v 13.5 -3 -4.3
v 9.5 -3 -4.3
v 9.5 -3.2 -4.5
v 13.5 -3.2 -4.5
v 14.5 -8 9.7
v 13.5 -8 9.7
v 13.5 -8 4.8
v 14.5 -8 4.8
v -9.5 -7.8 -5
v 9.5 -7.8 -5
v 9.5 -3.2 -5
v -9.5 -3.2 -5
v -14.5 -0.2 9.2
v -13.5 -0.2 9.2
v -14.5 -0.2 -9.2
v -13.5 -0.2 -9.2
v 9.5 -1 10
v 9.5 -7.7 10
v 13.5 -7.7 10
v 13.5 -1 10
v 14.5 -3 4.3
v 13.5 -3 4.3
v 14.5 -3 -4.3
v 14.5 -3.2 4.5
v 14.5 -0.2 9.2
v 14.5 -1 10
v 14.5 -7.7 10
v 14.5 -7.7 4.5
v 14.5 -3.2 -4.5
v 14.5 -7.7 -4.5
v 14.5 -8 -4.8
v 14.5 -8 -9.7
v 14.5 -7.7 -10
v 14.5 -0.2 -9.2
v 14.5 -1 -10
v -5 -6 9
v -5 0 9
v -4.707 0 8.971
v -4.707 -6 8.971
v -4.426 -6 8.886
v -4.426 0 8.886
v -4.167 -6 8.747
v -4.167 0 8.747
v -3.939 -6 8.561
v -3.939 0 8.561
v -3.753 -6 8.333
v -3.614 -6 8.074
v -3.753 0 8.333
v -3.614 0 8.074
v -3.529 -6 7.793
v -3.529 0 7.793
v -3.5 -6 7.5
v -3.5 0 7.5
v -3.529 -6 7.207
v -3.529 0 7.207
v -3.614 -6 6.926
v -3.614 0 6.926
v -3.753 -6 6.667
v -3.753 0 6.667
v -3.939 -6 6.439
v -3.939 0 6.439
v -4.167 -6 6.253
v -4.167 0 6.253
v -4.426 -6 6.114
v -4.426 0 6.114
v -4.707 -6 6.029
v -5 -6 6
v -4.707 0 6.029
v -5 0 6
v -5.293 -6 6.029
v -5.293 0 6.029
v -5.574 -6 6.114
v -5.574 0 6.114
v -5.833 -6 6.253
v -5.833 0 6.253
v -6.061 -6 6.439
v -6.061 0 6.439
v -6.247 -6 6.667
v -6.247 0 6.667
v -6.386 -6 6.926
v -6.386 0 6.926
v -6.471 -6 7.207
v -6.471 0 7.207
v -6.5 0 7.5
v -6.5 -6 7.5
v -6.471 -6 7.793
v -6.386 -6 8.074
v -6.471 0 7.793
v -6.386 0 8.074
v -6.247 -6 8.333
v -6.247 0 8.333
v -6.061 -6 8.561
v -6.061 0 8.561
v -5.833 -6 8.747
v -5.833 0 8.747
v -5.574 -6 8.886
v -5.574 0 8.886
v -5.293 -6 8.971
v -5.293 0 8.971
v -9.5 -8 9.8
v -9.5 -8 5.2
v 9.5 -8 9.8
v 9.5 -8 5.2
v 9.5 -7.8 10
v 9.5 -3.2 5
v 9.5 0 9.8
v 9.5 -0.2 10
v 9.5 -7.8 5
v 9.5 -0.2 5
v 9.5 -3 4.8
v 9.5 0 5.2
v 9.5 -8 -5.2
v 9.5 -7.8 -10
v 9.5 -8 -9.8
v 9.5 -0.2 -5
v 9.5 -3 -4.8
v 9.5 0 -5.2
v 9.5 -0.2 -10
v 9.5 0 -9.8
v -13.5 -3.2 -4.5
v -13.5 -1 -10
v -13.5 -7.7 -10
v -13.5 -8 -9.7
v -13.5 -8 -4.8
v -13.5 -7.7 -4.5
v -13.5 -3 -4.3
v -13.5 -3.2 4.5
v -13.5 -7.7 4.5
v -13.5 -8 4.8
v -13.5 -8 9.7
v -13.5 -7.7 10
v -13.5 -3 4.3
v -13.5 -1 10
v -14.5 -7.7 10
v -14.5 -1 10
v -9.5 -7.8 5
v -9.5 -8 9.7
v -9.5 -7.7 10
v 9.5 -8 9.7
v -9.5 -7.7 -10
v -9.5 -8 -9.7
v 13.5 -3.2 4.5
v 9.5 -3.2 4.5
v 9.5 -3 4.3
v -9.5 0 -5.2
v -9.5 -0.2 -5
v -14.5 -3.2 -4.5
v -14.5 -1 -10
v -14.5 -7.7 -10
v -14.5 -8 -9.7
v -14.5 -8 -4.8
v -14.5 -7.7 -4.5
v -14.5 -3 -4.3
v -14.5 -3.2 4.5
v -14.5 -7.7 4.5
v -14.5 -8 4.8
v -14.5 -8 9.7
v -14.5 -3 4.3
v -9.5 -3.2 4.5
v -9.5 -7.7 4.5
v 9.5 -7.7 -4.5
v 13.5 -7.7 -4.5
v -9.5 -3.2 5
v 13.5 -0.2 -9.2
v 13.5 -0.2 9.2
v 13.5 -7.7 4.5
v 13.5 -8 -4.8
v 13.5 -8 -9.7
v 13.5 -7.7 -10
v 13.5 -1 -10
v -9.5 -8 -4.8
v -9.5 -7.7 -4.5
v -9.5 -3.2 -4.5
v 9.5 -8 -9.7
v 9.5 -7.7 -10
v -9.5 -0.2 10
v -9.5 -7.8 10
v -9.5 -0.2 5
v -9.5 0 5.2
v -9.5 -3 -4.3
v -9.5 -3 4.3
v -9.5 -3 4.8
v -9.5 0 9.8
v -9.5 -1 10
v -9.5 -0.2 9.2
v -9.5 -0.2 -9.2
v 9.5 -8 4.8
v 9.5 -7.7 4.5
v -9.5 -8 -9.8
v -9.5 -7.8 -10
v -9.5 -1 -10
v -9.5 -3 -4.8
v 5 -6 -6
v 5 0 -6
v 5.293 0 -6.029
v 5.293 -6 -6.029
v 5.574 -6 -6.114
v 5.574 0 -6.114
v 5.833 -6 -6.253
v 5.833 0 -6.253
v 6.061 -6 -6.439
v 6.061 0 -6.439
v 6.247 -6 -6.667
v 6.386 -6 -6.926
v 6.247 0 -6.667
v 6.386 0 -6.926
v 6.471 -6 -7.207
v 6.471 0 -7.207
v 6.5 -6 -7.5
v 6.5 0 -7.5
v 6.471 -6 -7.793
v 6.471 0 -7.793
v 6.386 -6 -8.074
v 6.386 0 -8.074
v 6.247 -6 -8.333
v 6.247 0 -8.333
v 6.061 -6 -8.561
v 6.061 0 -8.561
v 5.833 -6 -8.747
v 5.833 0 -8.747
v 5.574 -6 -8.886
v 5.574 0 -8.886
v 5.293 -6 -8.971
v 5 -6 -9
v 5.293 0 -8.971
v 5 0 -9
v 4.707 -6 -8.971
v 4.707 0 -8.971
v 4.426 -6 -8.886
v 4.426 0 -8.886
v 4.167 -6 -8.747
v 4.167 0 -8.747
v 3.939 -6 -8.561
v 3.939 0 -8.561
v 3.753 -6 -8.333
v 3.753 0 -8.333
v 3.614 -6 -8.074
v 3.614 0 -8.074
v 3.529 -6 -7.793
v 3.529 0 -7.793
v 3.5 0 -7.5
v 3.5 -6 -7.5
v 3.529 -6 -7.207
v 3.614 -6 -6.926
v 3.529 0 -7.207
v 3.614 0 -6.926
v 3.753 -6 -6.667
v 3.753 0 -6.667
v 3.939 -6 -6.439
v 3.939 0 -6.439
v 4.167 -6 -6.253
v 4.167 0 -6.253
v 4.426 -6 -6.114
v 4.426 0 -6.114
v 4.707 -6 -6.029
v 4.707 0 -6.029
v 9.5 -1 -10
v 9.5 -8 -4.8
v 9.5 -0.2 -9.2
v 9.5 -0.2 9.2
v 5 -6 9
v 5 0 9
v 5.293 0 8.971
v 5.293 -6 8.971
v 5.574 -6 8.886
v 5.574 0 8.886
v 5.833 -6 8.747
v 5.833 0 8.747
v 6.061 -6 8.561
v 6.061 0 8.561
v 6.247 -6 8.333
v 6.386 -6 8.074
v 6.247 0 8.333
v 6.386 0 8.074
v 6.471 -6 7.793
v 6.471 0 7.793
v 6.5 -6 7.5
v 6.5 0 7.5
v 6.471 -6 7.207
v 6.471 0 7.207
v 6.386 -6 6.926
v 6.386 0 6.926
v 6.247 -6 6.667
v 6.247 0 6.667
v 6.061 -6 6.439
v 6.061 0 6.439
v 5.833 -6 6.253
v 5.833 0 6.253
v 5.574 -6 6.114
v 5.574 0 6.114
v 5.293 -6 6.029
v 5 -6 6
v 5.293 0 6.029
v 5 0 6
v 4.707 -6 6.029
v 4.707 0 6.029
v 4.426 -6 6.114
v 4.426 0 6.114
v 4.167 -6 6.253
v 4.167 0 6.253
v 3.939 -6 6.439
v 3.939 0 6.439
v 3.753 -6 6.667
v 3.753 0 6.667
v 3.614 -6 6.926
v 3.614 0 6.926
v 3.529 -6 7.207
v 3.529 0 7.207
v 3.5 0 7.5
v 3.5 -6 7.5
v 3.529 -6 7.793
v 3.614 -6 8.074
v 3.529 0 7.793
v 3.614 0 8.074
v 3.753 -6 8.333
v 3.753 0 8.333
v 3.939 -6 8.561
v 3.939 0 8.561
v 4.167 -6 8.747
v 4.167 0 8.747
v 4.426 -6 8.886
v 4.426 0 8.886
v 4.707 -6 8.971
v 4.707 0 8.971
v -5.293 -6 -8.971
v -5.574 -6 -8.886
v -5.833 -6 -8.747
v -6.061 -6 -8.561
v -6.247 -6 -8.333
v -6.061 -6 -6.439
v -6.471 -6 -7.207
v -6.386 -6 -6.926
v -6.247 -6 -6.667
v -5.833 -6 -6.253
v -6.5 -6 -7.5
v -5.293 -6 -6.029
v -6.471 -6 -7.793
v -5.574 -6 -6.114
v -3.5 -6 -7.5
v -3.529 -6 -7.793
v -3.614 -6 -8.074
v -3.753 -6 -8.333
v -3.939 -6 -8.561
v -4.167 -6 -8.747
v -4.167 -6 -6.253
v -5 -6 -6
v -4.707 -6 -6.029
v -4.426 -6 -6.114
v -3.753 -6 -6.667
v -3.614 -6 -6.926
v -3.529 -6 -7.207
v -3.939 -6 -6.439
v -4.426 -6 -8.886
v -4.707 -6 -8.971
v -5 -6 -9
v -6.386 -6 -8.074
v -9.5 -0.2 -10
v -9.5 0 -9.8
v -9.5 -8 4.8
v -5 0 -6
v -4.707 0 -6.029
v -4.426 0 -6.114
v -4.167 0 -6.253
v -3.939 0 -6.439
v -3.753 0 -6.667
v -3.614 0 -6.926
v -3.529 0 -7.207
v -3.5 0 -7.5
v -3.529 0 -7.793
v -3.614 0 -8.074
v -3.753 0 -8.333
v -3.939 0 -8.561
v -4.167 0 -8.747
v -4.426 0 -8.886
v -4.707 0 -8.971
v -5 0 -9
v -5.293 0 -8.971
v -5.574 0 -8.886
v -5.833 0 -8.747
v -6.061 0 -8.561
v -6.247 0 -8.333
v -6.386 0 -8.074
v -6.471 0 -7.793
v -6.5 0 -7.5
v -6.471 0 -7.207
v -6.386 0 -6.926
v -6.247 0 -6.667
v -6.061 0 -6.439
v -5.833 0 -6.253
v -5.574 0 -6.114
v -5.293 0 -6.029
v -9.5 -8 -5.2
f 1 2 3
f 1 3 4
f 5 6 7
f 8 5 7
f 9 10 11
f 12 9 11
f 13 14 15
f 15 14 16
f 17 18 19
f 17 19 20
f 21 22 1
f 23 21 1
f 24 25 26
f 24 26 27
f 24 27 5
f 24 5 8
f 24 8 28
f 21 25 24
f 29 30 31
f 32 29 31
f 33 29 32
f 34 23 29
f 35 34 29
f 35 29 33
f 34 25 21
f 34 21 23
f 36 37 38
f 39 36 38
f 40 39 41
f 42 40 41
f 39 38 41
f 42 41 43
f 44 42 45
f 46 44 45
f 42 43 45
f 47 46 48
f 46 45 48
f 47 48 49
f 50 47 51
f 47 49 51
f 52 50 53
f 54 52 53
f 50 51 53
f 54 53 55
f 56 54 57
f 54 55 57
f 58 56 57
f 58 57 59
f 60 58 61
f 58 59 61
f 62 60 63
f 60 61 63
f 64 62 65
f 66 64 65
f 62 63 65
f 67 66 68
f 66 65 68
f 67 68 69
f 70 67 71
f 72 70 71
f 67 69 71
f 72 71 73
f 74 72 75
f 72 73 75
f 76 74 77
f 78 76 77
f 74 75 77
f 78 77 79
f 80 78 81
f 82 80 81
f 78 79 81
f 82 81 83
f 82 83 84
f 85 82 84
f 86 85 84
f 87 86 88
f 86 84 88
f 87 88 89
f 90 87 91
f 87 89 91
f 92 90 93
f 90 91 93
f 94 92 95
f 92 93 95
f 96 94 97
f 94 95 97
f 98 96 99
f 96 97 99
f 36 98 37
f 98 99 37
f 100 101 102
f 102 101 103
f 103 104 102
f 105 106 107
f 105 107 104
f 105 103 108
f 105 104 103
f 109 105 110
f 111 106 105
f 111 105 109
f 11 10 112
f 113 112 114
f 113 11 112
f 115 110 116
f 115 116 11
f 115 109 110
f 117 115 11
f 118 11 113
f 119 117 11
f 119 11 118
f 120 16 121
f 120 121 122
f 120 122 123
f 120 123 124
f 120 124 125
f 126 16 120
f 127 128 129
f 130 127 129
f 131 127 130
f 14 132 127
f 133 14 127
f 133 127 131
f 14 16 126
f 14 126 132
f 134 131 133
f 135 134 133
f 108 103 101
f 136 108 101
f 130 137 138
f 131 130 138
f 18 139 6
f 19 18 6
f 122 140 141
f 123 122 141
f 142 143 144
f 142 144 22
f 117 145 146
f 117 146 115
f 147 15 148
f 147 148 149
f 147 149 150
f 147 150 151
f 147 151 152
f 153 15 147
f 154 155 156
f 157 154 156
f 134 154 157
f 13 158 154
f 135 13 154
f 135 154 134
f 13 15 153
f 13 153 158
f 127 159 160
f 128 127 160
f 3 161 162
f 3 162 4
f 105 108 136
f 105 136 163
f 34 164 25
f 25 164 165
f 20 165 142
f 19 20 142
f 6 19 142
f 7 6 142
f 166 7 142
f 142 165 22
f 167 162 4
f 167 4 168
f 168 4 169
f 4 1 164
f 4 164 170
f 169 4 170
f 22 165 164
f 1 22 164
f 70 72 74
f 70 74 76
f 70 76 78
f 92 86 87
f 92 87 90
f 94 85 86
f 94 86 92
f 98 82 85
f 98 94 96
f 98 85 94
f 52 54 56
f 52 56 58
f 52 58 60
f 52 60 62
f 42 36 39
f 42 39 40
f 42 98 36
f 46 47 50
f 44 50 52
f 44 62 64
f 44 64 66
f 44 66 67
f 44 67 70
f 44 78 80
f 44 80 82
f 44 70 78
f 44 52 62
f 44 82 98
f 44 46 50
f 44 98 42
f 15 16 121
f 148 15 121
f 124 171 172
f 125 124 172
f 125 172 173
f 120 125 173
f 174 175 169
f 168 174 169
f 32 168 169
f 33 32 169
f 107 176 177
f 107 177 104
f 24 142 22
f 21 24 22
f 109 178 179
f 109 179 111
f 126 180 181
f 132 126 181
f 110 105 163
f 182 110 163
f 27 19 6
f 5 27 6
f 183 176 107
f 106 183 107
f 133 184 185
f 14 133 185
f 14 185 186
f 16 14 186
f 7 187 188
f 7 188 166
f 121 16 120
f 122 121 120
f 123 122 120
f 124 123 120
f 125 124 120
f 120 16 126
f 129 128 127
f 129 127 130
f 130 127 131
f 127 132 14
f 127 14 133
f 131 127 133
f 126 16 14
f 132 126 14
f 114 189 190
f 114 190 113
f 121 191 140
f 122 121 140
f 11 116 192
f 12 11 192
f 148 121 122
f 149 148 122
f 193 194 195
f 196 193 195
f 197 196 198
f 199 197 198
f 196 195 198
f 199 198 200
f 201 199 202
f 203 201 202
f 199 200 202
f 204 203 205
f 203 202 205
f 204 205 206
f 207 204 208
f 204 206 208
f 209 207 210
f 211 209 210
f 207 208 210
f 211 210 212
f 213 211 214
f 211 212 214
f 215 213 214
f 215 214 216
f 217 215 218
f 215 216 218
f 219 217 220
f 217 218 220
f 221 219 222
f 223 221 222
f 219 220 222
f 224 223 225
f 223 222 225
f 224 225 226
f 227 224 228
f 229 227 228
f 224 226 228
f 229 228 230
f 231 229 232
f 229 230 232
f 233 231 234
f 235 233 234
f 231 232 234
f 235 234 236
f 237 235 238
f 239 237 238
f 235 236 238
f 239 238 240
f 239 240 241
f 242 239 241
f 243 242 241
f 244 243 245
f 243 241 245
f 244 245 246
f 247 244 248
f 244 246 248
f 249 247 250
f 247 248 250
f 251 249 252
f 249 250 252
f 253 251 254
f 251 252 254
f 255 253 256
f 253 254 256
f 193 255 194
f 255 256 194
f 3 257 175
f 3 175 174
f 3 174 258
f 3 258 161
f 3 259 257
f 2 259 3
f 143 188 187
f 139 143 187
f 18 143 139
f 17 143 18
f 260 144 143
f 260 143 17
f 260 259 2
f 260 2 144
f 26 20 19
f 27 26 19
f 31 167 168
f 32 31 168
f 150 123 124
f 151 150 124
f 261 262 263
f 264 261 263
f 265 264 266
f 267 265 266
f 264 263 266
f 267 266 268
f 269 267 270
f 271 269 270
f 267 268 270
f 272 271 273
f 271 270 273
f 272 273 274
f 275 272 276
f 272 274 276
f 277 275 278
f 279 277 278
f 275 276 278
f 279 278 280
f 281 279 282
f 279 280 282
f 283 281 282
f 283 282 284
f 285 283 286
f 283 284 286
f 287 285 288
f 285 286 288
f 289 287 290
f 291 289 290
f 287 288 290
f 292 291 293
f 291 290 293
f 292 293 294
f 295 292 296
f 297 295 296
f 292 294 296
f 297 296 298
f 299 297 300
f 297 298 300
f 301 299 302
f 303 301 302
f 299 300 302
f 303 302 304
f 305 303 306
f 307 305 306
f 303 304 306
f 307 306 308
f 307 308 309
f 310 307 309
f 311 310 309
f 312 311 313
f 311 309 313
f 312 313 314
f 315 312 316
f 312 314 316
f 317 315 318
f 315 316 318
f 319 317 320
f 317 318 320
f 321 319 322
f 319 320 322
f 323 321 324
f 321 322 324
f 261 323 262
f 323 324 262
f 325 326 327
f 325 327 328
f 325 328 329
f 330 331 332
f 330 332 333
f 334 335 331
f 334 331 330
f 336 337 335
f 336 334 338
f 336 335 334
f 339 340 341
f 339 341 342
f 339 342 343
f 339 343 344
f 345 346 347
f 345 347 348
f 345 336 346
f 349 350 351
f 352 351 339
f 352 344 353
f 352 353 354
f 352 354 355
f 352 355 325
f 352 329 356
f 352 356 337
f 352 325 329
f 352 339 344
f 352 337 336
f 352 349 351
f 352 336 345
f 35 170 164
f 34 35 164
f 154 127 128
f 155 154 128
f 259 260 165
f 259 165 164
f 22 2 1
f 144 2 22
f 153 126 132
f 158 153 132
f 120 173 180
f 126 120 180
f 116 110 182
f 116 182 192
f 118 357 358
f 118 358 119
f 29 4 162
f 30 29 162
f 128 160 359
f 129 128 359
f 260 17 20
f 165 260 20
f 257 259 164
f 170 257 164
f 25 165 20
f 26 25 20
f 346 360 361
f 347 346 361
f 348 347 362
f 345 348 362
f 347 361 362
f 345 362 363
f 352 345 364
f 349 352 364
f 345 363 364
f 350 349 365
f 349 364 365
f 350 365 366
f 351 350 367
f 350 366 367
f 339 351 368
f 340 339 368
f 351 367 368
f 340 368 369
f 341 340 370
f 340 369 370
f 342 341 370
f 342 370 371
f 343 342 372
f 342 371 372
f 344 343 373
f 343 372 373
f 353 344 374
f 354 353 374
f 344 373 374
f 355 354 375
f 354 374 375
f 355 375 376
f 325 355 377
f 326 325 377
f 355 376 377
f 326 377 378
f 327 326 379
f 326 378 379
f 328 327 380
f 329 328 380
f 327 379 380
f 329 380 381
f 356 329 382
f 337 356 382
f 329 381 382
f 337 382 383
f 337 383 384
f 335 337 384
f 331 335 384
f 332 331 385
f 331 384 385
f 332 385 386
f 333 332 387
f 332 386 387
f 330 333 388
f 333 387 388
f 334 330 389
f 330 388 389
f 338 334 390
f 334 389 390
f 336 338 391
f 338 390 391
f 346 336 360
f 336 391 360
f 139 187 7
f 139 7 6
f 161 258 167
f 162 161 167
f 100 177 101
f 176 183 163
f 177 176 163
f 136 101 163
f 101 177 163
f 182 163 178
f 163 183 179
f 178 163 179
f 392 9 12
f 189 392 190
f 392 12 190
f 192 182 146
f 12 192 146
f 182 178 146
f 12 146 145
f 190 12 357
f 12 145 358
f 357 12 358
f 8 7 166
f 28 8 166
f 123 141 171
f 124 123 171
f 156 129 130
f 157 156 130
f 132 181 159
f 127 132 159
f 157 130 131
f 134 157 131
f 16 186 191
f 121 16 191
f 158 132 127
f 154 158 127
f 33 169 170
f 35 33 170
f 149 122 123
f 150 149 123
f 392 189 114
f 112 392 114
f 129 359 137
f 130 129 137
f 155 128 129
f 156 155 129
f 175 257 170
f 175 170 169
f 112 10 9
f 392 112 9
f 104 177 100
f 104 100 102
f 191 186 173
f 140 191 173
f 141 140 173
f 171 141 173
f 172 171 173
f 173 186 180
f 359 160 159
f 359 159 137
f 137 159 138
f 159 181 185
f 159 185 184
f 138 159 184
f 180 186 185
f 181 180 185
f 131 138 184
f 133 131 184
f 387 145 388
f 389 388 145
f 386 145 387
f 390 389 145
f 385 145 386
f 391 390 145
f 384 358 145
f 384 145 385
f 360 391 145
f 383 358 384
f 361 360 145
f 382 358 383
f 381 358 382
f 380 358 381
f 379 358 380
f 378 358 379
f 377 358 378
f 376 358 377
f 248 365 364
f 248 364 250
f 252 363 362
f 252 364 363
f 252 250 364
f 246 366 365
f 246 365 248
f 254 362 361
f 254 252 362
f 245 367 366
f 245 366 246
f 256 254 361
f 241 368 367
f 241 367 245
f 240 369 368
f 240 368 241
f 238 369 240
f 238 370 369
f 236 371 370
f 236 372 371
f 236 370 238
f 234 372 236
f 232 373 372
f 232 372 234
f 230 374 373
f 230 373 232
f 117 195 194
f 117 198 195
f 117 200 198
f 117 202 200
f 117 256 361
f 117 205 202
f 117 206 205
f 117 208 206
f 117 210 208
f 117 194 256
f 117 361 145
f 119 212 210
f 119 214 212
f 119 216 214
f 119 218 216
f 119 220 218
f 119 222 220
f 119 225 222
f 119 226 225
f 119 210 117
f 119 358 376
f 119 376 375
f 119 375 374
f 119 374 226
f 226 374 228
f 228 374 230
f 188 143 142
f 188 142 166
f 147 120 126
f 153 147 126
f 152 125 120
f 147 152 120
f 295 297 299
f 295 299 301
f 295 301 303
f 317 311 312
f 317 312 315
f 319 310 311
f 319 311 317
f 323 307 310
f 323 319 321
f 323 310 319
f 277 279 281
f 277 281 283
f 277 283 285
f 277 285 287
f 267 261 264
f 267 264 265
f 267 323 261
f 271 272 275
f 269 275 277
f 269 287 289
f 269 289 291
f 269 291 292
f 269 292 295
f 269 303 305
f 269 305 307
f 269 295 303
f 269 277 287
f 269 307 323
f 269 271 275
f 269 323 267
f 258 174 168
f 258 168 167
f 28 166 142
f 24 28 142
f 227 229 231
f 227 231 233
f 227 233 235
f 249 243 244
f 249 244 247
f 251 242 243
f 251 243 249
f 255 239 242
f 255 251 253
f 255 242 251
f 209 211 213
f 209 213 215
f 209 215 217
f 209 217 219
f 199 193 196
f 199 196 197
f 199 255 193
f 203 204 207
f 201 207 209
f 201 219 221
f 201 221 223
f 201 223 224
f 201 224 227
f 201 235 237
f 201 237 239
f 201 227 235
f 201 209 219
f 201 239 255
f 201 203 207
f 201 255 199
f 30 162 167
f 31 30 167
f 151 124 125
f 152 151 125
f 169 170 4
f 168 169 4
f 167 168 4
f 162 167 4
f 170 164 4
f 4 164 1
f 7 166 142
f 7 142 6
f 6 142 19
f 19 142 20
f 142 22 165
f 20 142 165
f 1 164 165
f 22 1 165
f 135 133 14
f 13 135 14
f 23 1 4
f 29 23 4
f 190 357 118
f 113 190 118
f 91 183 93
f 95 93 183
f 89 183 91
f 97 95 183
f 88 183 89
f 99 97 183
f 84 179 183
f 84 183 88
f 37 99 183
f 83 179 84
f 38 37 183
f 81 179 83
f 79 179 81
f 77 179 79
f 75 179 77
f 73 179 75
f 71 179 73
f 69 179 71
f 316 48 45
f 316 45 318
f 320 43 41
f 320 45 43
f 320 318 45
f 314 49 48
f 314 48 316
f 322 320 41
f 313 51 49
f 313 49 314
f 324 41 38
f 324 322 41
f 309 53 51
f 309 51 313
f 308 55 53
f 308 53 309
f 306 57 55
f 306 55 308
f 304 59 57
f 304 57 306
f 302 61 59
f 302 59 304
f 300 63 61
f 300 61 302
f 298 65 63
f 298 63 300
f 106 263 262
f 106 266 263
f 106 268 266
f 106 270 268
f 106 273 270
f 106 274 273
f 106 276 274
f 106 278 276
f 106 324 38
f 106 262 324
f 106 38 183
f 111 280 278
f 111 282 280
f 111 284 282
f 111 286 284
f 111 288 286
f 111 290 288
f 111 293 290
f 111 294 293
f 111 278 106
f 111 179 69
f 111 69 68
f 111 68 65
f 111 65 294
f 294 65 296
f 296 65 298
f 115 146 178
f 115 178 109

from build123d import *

# Parameters (mm, degrees)
SKETCH_1_W          = 19
SKETCH_1_H          = 20
EXTRUDE_1_DEPTH     = 8
SKETCH_2_W          = 19
SKETCH_2_H          = 10
CUT_EXTRUDE_1_DEPTH = 0.2
CHAMFER_1_SIZE      = 0.2
SKETCH_3_R          = 1.5
CUT_EXTRUDE_2_DEPTH = 6
SKETCH_4_W          = 10
SKETCH_4_H          = 5
CUT_EXTRUDE_3_DEPTH = 19
CHAMFER_2_SIZE      = 0.2
EXTRUDE_2_DEPTH     = 4
CHAMFER_3_SIZE      = 0.2
CHAMFER_4_SIZE      = 0.3
CHAMFER_5_SIZE      = 0.8
EXTRUDE_3_DEPTH     = 4
EXTRUDE_4_DEPTH     = 1
EXTRUDE_5_DEPTH     = 1


with BuildPart() as part:
    # 草图1 → 凸台-拉伸1 (new body)
    with BuildSketch(Plane(origin=(0, 0, 0), x_dir=(1, 0, 0), z_dir=(0, 1, 0))):
        Rectangle(SKETCH_1_W, SKETCH_1_H)
    extrude(amount=-EXTRUDE_1_DEPTH)

    # 草图2 → 切除-拉伸1 (cut)
    with BuildSketch(Plane(origin=(0, 0, 0), x_dir=(1, 0, 0), z_dir=(0, 1, 0))):
        Rectangle(SKETCH_2_W, SKETCH_2_H)
    extrude(amount=-CUT_EXTRUDE_1_DEPTH, mode=Mode.SUBTRACT)

    # 倒角1
    chamfer_1_edges = [part.edges().sort_by_distance(p)[0] for p in [
        (0, -8, 10),
        (0, -8, -10),
        (0, 0, -10),
        (0, 0, 10),
        (0, 0, 5),
        (0, 0, -5),
    ]]
    chamfer(chamfer_1_edges, length=CHAMFER_1_SIZE - 0.0001)  # a hair under: the kernel refuses the full size

    # 草图3 → 切除-拉伸2 (cut)
    with BuildSketch(Plane(origin=(0, 0, 0), x_dir=(1, 0, 0), z_dir=(0, 1, 0))):
        with Locations(Location((-5, 7.5, 0), (0, 0, 270))):
            Circle(SKETCH_3_R)
        with Locations(Location((5, 7.5, 0), (0, 0, 270))):
            Circle(SKETCH_3_R)
        with Locations(Location((5, -7.5, 0), (0, 0, 270))):
            Circle(SKETCH_3_R)
        with Locations(Location((-5, -7.5, 0), (0, 0, 270))):
            Circle(SKETCH_3_R)
    extrude(amount=-CUT_EXTRUDE_2_DEPTH, mode=Mode.SUBTRACT)

    # 草图4 → 切除-拉伸3 (cut)
    with BuildSketch(Plane(origin=(9.5, 0, 0), x_dir=(0, 0, -1), z_dir=(1, 0, 0))):
        with Locations((0, -5.5)):
            Rectangle(SKETCH_4_W, SKETCH_4_H)
    extrude(amount=-CUT_EXTRUDE_3_DEPTH, mode=Mode.SUBTRACT)

    # 倒角2
    chamfer_2_edges = [part.edges().sort_by_distance(p)[0] for p in [
        (0, -3, -5),
        (0, -3, 5),
        (0, -8, 5),
        (0, -8, -5),
    ]]
    chamfer(chamfer_2_edges, length=CHAMFER_2_SIZE)


with BuildPart() as body_2:
    # 草图5 → 凸台-拉伸2 (new body)
    with BuildSketch(Plane(origin=(9.5, 0, 0), x_dir=(0, 0, -1), z_dir=(1, 0, 0))):
        Polygon((-10, -0.2), (10, -0.2), (10, -8), (4.5, -8), (4.5, -3), (-4.5, -3), (-4.5, -8), (-10, -8), align=None)
    extrude(amount=EXTRUDE_2_DEPTH)

    # 倒角3
    chamfer_3_edges = [body_2.edges().sort_by_distance(p)[0] for p in [
        (11.5, -3, -4.5),
        (11.5, -3, 4.5),
    ]]
    chamfer(chamfer_3_edges, length=CHAMFER_3_SIZE)

    # 倒角4
    chamfer_4_edges = [body_2.edges().sort_by_distance(p)[0] for p in [
        (11.5, -8, -10),
        (11.5, -8, -4.5),
        (11.5, -8, 4.5),
        (11.5, -8, 10),
    ]]
    chamfer(chamfer_4_edges, length=CHAMFER_4_SIZE)

    # 倒角5
    chamfer_5_edges = [body_2.edges().sort_by_distance(p)[0] for p in [
        (11.5, -0.2, 10),
        (11.5, -0.2, -10),
    ]]
    chamfer(chamfer_5_edges, length=CHAMFER_5_SIZE)


with BuildPart() as body_3:
    # 草图6 → 凸台-拉伸3 (new body)
    with BuildSketch(Plane.ZY.offset(9.5)):
        Polygon((9.2, -0.2), (-9.2, -0.2), (-10, -1), (-10, -7.7), (-9.7, -8), (-4.8, -8), (-4.5, -7.7), (-4.5, -3.2), (-4.3, -3), (4.3, -3), (4.5, -3.2), (4.5, -7.7), (4.8, -8), (9.7, -8), (10, -7.7), (10, -1), align=None)
    extrude(amount=EXTRUDE_3_DEPTH)


with BuildPart() as body_4:
    # 草图7 → 凸台-拉伸4 (new body)
    with BuildSketch(Plane.ZY.offset(13.5)):
        Polygon((-9.2, -0.2), (-10, -1), (-10, -7.7), (-9.7, -8), (-4.8, -8), (-4.5, -7.7), (-4.5, -3.2), (-4.3, -3), (4.3, -3), (4.5, -3.2), (4.5, -7.7), (4.8, -8), (9.7, -8), (10, -7.7), (10, -1), (9.2, -0.2), align=None)
    extrude(amount=EXTRUDE_4_DEPTH)


with BuildPart() as body_5:
    # 草图8 → 凸台-拉伸5 (new body)
    with BuildSketch(Plane(origin=(13.5, 0, 0), x_dir=(0, 0, -1), z_dir=(1, 0, 0))):
        Polygon((9.2, -0.2), (-9.2, -0.2), (-10, -1), (-10, -7.7), (-9.7, -8), (-4.8, -8), (-4.5, -7.7), (-4.5, -3.2), (-4.3, -3), (4.3, -3), (4.5, -3.2), (4.5, -7.7), (4.8, -8), (9.7, -8), (10, -7.7), (10, -1), align=None)
    extrude(amount=EXTRUDE_5_DEPTH)


solid = Compound([part.part, body_2.part, body_3.part, body_4.part, body_5.part])
